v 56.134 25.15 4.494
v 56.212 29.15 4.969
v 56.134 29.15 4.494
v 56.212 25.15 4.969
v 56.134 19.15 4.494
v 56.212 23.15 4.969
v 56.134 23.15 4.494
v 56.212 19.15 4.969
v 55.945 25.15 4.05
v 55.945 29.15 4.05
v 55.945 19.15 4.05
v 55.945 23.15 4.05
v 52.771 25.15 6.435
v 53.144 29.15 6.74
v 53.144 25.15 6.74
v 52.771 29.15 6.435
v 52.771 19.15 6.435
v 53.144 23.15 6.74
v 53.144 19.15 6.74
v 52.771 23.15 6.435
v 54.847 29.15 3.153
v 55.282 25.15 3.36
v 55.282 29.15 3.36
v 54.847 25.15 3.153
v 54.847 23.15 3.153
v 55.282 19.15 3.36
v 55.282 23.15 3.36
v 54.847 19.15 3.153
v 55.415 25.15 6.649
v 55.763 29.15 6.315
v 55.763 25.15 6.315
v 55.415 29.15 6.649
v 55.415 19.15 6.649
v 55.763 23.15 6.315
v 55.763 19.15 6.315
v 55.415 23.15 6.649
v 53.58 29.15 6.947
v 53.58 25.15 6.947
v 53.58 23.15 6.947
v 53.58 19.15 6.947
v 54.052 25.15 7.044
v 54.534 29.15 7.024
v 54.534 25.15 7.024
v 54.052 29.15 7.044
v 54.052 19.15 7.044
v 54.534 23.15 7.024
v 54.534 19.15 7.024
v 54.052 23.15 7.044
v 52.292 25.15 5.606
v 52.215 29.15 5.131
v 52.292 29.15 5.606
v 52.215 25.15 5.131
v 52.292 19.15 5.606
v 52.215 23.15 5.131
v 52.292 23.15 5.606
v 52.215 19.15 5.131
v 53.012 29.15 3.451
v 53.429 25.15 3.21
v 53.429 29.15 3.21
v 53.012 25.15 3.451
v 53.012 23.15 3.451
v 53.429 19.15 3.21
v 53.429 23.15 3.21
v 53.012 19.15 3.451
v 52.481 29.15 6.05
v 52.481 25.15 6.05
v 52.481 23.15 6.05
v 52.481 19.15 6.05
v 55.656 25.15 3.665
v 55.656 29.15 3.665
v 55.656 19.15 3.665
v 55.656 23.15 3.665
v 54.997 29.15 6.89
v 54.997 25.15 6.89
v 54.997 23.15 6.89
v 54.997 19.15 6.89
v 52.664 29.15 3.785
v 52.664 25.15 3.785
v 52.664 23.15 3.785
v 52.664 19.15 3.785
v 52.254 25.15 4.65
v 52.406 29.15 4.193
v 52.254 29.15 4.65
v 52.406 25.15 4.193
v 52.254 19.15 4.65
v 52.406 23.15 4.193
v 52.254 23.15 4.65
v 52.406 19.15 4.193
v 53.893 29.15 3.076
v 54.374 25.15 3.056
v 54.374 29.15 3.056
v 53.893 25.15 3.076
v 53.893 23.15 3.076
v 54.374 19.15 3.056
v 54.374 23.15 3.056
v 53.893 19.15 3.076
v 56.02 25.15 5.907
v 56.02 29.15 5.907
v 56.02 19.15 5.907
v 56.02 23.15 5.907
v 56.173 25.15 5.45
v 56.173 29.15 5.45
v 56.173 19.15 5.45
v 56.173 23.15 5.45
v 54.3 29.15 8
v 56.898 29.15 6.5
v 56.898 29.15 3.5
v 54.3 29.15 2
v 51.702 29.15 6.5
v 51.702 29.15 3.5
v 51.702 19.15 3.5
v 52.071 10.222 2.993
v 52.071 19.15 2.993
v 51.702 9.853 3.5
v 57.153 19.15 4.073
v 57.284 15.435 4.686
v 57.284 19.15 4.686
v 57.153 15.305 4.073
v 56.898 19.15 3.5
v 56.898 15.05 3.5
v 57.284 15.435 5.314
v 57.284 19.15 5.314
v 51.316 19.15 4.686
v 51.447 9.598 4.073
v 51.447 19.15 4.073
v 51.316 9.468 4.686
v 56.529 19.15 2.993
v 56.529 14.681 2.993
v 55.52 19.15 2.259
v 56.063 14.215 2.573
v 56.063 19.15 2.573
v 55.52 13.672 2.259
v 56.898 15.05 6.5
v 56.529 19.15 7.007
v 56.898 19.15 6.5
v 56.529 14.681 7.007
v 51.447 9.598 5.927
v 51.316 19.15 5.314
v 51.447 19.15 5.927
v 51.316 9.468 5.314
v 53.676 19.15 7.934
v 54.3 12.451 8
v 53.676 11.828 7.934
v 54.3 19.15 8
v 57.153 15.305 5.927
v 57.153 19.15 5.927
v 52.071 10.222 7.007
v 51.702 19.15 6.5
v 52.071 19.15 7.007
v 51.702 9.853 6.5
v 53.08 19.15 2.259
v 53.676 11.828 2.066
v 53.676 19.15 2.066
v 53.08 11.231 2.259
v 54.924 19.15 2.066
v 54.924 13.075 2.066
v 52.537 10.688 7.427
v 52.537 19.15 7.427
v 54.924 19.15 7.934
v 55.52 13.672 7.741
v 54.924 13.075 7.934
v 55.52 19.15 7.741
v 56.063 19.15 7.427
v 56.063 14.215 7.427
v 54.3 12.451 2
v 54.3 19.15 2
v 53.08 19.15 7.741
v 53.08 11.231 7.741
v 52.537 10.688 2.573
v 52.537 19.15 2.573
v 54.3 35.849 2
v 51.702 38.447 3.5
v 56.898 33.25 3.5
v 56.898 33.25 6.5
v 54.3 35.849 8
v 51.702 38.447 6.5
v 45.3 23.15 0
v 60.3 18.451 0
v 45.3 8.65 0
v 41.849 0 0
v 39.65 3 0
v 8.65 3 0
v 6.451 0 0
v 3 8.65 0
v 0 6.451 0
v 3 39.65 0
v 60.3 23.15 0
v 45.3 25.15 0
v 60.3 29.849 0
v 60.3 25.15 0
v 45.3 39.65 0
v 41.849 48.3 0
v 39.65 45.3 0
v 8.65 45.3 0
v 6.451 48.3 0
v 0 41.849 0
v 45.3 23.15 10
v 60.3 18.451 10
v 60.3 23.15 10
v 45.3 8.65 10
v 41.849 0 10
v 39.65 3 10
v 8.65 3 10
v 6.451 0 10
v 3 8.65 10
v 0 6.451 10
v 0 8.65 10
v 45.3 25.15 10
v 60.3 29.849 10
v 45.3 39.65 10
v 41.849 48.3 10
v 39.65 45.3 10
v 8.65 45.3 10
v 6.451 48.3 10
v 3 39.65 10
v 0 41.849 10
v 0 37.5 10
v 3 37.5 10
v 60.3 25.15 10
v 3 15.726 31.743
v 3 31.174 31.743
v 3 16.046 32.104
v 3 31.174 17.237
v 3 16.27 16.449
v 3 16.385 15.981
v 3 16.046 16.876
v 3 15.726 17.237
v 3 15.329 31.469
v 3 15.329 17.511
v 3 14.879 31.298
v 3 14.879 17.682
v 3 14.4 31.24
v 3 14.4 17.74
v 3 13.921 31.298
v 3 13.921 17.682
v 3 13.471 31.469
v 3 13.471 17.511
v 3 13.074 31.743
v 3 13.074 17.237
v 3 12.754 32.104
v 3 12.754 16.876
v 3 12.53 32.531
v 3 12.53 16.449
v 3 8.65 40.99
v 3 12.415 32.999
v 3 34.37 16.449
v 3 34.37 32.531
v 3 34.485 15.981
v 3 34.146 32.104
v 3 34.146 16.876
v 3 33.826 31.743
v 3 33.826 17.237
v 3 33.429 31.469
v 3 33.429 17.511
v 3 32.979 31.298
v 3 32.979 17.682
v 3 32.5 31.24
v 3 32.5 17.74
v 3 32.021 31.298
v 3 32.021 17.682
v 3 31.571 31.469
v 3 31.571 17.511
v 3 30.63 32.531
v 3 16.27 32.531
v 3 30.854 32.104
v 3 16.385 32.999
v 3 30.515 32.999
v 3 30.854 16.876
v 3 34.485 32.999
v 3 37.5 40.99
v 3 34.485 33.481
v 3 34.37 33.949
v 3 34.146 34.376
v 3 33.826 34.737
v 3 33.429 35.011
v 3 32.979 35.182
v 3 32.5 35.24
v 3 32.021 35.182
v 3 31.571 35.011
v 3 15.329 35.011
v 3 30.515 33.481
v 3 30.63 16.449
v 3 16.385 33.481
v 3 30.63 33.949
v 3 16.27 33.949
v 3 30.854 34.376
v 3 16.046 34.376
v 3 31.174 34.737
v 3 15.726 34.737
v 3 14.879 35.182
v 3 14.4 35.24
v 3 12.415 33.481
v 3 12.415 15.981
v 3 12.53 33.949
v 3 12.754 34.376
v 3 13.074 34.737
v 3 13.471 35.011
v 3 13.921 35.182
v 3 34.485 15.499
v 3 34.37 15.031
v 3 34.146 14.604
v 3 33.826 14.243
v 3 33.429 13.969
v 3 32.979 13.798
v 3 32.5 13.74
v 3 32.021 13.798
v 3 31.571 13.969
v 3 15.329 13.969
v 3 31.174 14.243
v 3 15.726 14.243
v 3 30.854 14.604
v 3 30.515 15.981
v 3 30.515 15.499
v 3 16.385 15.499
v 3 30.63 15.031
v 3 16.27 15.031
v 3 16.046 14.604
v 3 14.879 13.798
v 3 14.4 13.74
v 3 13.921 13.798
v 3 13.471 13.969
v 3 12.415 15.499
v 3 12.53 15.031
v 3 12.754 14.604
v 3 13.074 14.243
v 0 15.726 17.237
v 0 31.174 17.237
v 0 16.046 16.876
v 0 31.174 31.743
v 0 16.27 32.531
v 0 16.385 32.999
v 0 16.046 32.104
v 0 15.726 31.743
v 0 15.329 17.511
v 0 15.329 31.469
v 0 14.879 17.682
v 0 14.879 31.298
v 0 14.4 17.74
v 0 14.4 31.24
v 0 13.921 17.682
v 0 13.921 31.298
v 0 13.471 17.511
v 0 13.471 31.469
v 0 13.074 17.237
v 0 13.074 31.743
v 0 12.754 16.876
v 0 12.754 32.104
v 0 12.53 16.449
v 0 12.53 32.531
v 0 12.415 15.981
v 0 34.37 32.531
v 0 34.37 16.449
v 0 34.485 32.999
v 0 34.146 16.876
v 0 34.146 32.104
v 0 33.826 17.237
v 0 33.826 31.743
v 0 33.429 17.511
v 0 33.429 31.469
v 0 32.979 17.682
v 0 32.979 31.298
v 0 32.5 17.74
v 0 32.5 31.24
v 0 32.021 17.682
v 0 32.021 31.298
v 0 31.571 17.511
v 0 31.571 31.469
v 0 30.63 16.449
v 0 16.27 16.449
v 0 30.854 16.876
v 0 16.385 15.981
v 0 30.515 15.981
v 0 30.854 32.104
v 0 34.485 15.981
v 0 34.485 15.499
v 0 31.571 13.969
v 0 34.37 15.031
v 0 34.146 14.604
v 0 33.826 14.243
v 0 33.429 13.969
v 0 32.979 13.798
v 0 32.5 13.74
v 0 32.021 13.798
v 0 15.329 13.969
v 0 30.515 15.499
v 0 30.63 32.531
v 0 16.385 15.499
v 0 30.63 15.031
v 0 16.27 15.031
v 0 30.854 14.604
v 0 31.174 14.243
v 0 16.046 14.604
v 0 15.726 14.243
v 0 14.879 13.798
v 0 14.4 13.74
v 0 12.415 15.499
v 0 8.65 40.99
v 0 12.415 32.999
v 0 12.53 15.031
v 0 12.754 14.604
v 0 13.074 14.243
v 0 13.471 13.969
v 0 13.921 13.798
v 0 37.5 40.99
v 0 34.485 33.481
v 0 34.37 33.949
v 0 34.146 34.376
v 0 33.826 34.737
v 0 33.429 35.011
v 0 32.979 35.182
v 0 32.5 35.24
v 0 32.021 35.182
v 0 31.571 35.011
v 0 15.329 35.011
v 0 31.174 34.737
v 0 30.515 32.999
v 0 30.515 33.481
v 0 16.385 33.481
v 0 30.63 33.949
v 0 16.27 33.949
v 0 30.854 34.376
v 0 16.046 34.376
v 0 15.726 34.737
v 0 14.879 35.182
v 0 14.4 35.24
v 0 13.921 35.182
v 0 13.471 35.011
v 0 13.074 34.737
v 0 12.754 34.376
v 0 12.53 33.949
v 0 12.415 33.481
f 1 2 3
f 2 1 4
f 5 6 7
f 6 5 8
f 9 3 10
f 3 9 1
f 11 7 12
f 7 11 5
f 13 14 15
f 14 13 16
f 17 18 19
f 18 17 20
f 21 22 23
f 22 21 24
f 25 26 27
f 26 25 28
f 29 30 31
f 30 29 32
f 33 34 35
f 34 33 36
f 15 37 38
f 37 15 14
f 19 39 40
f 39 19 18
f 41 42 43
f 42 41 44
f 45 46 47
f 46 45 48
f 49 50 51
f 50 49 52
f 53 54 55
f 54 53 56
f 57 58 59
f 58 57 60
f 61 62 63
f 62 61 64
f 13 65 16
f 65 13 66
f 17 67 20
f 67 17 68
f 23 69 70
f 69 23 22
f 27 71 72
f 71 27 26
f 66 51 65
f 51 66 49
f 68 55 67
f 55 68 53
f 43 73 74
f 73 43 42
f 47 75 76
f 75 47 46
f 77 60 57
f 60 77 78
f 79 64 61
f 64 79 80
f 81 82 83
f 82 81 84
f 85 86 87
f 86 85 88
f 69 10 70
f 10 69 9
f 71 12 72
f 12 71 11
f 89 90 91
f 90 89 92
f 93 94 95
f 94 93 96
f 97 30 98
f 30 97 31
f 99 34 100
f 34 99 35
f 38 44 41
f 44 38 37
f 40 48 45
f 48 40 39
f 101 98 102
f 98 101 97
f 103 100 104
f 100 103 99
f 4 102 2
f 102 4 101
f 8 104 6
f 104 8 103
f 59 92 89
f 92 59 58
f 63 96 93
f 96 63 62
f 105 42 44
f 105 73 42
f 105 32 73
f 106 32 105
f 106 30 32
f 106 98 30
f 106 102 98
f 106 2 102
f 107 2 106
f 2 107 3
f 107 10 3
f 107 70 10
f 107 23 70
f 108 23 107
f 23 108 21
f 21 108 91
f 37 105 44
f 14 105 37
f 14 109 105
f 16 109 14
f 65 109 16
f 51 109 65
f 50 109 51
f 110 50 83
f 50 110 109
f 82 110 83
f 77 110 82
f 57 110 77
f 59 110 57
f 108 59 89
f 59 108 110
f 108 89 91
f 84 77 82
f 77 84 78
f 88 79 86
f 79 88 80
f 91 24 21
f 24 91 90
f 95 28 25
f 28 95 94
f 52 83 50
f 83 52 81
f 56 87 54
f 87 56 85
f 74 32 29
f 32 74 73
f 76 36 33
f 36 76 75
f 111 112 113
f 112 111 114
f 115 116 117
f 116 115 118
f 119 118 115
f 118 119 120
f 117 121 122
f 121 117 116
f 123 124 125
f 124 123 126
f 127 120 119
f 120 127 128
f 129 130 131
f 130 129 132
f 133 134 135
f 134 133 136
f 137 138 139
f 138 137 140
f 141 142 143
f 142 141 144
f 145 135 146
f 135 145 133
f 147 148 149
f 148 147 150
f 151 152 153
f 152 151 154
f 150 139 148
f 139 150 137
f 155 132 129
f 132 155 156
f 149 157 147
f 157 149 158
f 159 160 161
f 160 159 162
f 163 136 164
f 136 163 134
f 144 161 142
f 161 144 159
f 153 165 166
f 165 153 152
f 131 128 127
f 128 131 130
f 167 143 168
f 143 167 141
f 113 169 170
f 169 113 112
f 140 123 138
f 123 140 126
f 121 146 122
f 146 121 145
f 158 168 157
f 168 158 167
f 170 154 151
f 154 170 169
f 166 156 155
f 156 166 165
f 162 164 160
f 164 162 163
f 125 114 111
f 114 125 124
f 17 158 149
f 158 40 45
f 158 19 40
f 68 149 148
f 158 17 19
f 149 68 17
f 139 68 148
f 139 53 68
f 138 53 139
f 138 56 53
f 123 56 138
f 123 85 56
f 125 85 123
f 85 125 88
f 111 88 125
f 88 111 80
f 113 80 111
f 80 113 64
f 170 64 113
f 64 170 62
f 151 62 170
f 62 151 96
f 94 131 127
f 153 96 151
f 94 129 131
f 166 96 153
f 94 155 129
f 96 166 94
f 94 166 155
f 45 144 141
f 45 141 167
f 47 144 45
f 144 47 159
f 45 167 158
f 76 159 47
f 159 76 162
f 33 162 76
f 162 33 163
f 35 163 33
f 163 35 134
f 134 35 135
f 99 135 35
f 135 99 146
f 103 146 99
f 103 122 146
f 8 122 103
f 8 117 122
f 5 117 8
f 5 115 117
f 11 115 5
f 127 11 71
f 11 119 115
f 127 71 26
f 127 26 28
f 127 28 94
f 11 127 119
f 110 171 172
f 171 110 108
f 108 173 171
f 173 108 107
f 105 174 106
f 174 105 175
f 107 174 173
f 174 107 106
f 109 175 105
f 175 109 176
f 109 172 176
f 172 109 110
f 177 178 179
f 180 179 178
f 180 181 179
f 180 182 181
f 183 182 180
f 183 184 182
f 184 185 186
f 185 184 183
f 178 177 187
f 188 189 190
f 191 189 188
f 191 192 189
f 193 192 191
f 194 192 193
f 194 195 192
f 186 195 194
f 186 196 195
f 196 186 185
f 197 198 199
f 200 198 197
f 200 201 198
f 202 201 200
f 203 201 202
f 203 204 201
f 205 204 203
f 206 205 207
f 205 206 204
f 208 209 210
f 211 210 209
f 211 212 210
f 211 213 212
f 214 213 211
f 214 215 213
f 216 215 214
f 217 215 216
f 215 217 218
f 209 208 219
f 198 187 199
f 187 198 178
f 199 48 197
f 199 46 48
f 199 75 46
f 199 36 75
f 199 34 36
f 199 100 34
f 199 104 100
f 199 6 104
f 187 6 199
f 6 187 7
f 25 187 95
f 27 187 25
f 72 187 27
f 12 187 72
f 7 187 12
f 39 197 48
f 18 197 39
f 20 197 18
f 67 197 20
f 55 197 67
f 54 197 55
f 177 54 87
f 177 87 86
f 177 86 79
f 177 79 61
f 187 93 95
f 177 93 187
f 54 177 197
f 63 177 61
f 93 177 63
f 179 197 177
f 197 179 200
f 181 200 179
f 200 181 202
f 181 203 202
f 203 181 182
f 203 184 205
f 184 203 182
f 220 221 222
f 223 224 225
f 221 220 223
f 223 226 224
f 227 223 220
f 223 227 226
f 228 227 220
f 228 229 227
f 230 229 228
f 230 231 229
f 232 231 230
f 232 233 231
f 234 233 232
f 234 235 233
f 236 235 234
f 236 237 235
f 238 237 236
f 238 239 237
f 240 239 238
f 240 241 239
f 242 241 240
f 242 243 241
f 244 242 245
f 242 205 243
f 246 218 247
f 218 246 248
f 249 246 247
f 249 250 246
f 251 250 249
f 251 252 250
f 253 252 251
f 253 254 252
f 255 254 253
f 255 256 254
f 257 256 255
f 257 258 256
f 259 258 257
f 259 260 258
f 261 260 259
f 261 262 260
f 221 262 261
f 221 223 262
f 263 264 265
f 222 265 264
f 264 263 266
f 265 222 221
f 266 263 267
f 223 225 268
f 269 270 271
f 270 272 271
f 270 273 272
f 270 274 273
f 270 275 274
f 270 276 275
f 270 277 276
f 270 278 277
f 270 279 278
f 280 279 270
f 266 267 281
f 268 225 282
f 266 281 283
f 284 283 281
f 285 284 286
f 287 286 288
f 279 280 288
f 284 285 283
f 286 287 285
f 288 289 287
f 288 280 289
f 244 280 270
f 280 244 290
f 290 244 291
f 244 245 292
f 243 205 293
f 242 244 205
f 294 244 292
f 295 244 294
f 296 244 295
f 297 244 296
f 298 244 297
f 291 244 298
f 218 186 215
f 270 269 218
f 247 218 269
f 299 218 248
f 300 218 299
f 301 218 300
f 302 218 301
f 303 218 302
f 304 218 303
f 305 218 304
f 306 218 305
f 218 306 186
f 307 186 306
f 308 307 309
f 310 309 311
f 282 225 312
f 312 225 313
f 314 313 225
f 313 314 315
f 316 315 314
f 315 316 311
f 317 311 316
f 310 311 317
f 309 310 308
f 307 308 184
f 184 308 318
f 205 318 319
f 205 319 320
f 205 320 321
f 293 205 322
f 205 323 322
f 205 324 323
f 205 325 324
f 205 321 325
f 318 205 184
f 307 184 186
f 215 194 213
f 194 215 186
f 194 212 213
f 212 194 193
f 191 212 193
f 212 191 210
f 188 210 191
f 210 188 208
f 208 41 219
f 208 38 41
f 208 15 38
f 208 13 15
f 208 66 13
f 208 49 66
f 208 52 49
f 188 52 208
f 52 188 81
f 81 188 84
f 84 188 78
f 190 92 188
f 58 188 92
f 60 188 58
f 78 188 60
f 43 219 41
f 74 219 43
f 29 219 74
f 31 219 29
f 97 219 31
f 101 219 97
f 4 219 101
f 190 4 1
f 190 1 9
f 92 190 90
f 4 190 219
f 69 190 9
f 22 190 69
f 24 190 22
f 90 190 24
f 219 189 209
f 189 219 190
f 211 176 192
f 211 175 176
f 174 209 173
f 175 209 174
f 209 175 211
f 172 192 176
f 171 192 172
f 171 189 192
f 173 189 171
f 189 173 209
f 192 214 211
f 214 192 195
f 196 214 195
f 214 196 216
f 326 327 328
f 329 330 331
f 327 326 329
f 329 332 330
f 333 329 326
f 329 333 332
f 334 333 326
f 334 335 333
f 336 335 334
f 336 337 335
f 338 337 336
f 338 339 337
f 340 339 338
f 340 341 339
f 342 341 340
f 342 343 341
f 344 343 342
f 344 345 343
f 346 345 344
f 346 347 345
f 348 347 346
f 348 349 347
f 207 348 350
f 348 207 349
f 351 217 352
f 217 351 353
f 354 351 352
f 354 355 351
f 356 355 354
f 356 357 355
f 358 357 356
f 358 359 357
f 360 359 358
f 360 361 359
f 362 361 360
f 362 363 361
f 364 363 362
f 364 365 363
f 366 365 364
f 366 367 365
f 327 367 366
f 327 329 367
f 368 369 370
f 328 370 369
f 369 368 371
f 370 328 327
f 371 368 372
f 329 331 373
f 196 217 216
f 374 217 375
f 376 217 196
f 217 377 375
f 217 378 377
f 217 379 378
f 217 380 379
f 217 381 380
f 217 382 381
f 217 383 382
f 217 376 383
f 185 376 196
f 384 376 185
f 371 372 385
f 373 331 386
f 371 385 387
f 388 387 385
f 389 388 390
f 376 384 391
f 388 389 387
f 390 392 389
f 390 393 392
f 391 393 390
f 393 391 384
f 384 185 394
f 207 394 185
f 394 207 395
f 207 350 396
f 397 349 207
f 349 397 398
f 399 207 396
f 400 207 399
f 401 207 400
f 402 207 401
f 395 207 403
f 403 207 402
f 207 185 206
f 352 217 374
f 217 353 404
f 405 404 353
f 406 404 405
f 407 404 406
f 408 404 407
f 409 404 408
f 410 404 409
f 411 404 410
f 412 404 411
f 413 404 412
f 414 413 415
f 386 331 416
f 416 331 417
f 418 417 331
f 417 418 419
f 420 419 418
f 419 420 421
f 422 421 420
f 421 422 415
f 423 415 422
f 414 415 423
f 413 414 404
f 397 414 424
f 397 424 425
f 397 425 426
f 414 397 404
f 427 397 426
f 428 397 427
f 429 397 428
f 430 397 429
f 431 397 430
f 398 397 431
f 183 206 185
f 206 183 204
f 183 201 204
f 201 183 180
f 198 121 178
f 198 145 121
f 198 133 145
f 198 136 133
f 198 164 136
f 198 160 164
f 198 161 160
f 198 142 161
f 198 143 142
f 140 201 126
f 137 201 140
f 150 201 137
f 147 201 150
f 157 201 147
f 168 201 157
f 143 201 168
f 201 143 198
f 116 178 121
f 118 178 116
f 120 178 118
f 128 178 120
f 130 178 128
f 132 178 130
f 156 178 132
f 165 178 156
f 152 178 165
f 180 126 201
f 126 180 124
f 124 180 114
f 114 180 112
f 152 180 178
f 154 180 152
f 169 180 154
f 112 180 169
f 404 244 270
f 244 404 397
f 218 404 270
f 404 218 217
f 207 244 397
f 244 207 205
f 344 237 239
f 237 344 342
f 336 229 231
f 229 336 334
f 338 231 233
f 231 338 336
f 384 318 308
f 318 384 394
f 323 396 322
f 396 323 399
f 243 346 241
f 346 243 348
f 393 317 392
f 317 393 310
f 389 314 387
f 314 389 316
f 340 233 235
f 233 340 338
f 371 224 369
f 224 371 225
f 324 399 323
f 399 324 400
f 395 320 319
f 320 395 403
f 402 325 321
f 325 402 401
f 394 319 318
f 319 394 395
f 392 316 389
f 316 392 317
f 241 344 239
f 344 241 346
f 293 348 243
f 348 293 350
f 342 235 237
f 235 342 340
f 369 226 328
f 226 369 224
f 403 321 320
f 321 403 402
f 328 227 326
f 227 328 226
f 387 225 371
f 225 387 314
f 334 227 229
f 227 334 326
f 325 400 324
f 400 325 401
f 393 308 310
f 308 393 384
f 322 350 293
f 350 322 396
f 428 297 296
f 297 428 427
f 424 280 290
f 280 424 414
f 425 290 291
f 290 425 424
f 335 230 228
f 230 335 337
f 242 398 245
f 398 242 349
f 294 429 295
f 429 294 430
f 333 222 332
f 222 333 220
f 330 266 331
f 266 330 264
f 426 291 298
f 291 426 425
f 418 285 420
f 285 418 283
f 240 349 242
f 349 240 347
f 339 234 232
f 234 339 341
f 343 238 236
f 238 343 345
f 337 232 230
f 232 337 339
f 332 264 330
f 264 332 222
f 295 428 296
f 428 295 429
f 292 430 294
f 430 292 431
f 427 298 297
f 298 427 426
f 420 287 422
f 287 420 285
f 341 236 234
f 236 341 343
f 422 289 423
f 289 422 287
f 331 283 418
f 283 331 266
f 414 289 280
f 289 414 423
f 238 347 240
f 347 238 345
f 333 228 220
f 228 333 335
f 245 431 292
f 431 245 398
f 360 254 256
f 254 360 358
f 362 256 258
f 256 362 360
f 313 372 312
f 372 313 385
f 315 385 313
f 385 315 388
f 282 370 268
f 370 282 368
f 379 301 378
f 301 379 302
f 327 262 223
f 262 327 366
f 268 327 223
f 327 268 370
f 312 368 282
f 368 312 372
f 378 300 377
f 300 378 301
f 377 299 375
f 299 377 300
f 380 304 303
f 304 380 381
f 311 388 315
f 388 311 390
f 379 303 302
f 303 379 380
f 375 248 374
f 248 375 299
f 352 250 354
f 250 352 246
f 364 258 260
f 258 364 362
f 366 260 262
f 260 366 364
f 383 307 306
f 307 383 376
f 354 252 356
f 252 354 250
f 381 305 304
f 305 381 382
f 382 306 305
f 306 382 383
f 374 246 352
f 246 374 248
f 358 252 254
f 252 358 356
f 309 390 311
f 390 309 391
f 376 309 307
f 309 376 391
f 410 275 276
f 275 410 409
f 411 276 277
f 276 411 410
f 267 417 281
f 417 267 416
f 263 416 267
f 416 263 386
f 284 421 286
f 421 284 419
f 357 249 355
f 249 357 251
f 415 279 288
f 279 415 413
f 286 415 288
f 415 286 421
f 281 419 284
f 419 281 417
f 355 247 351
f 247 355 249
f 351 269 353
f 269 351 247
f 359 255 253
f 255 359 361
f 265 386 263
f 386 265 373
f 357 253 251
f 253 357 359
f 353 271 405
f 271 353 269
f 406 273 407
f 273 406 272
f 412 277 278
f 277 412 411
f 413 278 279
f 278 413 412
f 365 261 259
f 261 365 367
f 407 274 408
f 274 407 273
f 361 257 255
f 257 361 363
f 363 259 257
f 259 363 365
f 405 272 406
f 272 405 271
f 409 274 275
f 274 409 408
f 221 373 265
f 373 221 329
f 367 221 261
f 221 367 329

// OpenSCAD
motor_outer = 42.3;
motor_inner = 31.0;
motor_diff = (motor_outer - motor_inner) / 2.0;
motor_wall = 3.0;

surround_height = 10.0;

clamp_gap = 2.0;
clamp_height = 12.0;
clamp_outer = motor_outer+2*motor_wall;
clamp_inner = (clamp_outer / motor_outer) * motor_inner;
clamp_diff = (clamp_outer - clamp_inner) / 2.0;

screw_diameter = 4.0;
screw_head_diameter = screw_diameter + 2.0;
screw_nut_diameter = screw_diameter + 2.0;
screw_length = clamp_gap + 2*4.0;

support_hole_diameter = 4.0;
support_x_inner_space = 17.5;
support_y_inner_space = 18.1;
support_x = motor_inner;
support_space = (support_x - (support_x_inner_space + 2*support_hole_diameter)) / 2;
support_y = support_y_inner_space + 2*support_hole_diameter + support_space;

module cut_corner_square(outer, inner) {    
    // Work out the dimentions of the chamfer square
    diff = (outer-inner) / 2.0;
    diff_dash = sqrt(pow(diff, 2) * 2);
    inner_dash = sqrt(pow(inner, 2) / 2);
    chamfer = diff_dash + 2 * inner_dash;
    
    intersection() {
        square([outer, outer]);
        translate([inner/2+diff, -inner/2, 0])
            rotate(45)
                square([chamfer, chamfer]);
    }
}

module motor_surround() {
    difference() {
        resize([clamp_outer, clamp_outer]) {
            cut_corner_square(motor_outer, motor_inner);
        }
        translate([motor_wall, motor_wall]) {
            cut_corner_square(motor_outer, motor_inner);
        }
    }
}

module clamp() {
    chamfer_wh = 2*clamp_height;
    chamfer_hyp = sqrt(2 * pow(chamfer_wh, 2));

    translate([clamp_outer, clamp_diff, 0]) {
        difference() {
            square([clamp_height, clamp_inner]);
            translate([chamfer_hyp/2.0, -chamfer_hyp/2.0, 0]) {
                rotate([0, 0, 45]) {
                    square([2*clamp_height, 2*clamp_height]);
                }
            }
            translate([chamfer_hyp/2.0, clamp_inner-chamfer_hyp/2.0, 0]) {
                rotate([0, 0, 45]) {
                    square([2*clamp_height, 2*clamp_height]);
                }
            }
        }
    }
}

module motor_with_clamp() {
    difference() {
        union() {
            motor_surround();
            clamp();
        }
        // Clamp gap
        translate([clamp_outer-motor_wall-1, (clamp_outer-clamp_gap)/2, 0]) {
            square([clamp_height+motor_wall+2, clamp_gap]);
        }
    }
}

module screw(shaft_d, shaft_l, head_d, head_l, nut_d, nut_l) {
    union() {
        // Shaft
        translate([-0.1, 0, 0])
            cylinder(h=shaft_l+0.2, d=shaft_d, $fs=0.5);
        // Head
        translate([0, 0, shaft_l])
            cylinder(h=head_l, d=head_d, $fs=0.5);
        // Nut
        translate([0, 0, -nut_l])
            cylinder(h=nut_l, d=nut_d, $fn=6);
    }
}

module full_surround() {
    difference() {
        linear_extrude(surround_height) {
            motor_with_clamp();
        }
        translate([clamp_outer+clamp_height/2, (clamp_outer+screw_length)/2, surround_height/2]) {
            rotate([0, 360/12, 0]) {
                rotate([90, 0, 0]) {
                    screw(
                        shaft_d=screw_diameter,
                        shaft_l=screw_length,
                        head_d=screw_head_diameter,
                        head_l=clamp_outer+1.0,
                        nut_d=screw_nut_diameter,
                        nut_l=clamp_outer+1.0
                    );
                }
            }
        }
    }
}

module support() {
    support_hole_centre = support_space+support_hole_diameter*3/4;
    difference() {
        cube([support_x, support_y, motor_wall]);
        translate([support_hole_centre, support_hole_centre, -motor_wall/2]) {
            cylinder(h=2*motor_wall, d=4, $fs=0.5);
        }
        translate([support_hole_centre+support_x_inner_space, support_hole_centre, -motor_wall/2]) {
            cylinder(h=2*motor_wall, d=4, $fs=0.5);
        }
        translate([support_hole_centre, support_hole_centre+support_y_inner_space, -motor_wall/2]) {
            cylinder(h=2*motor_wall, d=4, $fs=0.5);
        }
        translate([support_hole_centre+support_x_inner_space, support_hole_centre+support_y_inner_space, -motor_wall/2]) {
            cylinder(h=2*motor_wall, d=4, $fs=0.5);
        }
    }
}

union() {
    full_surround();
    translate([motor_wall, motor_diff+motor_wall, surround_height-0.01]) {
        rotate([0, -90, 0]) {
            support();
        }
    }
}
